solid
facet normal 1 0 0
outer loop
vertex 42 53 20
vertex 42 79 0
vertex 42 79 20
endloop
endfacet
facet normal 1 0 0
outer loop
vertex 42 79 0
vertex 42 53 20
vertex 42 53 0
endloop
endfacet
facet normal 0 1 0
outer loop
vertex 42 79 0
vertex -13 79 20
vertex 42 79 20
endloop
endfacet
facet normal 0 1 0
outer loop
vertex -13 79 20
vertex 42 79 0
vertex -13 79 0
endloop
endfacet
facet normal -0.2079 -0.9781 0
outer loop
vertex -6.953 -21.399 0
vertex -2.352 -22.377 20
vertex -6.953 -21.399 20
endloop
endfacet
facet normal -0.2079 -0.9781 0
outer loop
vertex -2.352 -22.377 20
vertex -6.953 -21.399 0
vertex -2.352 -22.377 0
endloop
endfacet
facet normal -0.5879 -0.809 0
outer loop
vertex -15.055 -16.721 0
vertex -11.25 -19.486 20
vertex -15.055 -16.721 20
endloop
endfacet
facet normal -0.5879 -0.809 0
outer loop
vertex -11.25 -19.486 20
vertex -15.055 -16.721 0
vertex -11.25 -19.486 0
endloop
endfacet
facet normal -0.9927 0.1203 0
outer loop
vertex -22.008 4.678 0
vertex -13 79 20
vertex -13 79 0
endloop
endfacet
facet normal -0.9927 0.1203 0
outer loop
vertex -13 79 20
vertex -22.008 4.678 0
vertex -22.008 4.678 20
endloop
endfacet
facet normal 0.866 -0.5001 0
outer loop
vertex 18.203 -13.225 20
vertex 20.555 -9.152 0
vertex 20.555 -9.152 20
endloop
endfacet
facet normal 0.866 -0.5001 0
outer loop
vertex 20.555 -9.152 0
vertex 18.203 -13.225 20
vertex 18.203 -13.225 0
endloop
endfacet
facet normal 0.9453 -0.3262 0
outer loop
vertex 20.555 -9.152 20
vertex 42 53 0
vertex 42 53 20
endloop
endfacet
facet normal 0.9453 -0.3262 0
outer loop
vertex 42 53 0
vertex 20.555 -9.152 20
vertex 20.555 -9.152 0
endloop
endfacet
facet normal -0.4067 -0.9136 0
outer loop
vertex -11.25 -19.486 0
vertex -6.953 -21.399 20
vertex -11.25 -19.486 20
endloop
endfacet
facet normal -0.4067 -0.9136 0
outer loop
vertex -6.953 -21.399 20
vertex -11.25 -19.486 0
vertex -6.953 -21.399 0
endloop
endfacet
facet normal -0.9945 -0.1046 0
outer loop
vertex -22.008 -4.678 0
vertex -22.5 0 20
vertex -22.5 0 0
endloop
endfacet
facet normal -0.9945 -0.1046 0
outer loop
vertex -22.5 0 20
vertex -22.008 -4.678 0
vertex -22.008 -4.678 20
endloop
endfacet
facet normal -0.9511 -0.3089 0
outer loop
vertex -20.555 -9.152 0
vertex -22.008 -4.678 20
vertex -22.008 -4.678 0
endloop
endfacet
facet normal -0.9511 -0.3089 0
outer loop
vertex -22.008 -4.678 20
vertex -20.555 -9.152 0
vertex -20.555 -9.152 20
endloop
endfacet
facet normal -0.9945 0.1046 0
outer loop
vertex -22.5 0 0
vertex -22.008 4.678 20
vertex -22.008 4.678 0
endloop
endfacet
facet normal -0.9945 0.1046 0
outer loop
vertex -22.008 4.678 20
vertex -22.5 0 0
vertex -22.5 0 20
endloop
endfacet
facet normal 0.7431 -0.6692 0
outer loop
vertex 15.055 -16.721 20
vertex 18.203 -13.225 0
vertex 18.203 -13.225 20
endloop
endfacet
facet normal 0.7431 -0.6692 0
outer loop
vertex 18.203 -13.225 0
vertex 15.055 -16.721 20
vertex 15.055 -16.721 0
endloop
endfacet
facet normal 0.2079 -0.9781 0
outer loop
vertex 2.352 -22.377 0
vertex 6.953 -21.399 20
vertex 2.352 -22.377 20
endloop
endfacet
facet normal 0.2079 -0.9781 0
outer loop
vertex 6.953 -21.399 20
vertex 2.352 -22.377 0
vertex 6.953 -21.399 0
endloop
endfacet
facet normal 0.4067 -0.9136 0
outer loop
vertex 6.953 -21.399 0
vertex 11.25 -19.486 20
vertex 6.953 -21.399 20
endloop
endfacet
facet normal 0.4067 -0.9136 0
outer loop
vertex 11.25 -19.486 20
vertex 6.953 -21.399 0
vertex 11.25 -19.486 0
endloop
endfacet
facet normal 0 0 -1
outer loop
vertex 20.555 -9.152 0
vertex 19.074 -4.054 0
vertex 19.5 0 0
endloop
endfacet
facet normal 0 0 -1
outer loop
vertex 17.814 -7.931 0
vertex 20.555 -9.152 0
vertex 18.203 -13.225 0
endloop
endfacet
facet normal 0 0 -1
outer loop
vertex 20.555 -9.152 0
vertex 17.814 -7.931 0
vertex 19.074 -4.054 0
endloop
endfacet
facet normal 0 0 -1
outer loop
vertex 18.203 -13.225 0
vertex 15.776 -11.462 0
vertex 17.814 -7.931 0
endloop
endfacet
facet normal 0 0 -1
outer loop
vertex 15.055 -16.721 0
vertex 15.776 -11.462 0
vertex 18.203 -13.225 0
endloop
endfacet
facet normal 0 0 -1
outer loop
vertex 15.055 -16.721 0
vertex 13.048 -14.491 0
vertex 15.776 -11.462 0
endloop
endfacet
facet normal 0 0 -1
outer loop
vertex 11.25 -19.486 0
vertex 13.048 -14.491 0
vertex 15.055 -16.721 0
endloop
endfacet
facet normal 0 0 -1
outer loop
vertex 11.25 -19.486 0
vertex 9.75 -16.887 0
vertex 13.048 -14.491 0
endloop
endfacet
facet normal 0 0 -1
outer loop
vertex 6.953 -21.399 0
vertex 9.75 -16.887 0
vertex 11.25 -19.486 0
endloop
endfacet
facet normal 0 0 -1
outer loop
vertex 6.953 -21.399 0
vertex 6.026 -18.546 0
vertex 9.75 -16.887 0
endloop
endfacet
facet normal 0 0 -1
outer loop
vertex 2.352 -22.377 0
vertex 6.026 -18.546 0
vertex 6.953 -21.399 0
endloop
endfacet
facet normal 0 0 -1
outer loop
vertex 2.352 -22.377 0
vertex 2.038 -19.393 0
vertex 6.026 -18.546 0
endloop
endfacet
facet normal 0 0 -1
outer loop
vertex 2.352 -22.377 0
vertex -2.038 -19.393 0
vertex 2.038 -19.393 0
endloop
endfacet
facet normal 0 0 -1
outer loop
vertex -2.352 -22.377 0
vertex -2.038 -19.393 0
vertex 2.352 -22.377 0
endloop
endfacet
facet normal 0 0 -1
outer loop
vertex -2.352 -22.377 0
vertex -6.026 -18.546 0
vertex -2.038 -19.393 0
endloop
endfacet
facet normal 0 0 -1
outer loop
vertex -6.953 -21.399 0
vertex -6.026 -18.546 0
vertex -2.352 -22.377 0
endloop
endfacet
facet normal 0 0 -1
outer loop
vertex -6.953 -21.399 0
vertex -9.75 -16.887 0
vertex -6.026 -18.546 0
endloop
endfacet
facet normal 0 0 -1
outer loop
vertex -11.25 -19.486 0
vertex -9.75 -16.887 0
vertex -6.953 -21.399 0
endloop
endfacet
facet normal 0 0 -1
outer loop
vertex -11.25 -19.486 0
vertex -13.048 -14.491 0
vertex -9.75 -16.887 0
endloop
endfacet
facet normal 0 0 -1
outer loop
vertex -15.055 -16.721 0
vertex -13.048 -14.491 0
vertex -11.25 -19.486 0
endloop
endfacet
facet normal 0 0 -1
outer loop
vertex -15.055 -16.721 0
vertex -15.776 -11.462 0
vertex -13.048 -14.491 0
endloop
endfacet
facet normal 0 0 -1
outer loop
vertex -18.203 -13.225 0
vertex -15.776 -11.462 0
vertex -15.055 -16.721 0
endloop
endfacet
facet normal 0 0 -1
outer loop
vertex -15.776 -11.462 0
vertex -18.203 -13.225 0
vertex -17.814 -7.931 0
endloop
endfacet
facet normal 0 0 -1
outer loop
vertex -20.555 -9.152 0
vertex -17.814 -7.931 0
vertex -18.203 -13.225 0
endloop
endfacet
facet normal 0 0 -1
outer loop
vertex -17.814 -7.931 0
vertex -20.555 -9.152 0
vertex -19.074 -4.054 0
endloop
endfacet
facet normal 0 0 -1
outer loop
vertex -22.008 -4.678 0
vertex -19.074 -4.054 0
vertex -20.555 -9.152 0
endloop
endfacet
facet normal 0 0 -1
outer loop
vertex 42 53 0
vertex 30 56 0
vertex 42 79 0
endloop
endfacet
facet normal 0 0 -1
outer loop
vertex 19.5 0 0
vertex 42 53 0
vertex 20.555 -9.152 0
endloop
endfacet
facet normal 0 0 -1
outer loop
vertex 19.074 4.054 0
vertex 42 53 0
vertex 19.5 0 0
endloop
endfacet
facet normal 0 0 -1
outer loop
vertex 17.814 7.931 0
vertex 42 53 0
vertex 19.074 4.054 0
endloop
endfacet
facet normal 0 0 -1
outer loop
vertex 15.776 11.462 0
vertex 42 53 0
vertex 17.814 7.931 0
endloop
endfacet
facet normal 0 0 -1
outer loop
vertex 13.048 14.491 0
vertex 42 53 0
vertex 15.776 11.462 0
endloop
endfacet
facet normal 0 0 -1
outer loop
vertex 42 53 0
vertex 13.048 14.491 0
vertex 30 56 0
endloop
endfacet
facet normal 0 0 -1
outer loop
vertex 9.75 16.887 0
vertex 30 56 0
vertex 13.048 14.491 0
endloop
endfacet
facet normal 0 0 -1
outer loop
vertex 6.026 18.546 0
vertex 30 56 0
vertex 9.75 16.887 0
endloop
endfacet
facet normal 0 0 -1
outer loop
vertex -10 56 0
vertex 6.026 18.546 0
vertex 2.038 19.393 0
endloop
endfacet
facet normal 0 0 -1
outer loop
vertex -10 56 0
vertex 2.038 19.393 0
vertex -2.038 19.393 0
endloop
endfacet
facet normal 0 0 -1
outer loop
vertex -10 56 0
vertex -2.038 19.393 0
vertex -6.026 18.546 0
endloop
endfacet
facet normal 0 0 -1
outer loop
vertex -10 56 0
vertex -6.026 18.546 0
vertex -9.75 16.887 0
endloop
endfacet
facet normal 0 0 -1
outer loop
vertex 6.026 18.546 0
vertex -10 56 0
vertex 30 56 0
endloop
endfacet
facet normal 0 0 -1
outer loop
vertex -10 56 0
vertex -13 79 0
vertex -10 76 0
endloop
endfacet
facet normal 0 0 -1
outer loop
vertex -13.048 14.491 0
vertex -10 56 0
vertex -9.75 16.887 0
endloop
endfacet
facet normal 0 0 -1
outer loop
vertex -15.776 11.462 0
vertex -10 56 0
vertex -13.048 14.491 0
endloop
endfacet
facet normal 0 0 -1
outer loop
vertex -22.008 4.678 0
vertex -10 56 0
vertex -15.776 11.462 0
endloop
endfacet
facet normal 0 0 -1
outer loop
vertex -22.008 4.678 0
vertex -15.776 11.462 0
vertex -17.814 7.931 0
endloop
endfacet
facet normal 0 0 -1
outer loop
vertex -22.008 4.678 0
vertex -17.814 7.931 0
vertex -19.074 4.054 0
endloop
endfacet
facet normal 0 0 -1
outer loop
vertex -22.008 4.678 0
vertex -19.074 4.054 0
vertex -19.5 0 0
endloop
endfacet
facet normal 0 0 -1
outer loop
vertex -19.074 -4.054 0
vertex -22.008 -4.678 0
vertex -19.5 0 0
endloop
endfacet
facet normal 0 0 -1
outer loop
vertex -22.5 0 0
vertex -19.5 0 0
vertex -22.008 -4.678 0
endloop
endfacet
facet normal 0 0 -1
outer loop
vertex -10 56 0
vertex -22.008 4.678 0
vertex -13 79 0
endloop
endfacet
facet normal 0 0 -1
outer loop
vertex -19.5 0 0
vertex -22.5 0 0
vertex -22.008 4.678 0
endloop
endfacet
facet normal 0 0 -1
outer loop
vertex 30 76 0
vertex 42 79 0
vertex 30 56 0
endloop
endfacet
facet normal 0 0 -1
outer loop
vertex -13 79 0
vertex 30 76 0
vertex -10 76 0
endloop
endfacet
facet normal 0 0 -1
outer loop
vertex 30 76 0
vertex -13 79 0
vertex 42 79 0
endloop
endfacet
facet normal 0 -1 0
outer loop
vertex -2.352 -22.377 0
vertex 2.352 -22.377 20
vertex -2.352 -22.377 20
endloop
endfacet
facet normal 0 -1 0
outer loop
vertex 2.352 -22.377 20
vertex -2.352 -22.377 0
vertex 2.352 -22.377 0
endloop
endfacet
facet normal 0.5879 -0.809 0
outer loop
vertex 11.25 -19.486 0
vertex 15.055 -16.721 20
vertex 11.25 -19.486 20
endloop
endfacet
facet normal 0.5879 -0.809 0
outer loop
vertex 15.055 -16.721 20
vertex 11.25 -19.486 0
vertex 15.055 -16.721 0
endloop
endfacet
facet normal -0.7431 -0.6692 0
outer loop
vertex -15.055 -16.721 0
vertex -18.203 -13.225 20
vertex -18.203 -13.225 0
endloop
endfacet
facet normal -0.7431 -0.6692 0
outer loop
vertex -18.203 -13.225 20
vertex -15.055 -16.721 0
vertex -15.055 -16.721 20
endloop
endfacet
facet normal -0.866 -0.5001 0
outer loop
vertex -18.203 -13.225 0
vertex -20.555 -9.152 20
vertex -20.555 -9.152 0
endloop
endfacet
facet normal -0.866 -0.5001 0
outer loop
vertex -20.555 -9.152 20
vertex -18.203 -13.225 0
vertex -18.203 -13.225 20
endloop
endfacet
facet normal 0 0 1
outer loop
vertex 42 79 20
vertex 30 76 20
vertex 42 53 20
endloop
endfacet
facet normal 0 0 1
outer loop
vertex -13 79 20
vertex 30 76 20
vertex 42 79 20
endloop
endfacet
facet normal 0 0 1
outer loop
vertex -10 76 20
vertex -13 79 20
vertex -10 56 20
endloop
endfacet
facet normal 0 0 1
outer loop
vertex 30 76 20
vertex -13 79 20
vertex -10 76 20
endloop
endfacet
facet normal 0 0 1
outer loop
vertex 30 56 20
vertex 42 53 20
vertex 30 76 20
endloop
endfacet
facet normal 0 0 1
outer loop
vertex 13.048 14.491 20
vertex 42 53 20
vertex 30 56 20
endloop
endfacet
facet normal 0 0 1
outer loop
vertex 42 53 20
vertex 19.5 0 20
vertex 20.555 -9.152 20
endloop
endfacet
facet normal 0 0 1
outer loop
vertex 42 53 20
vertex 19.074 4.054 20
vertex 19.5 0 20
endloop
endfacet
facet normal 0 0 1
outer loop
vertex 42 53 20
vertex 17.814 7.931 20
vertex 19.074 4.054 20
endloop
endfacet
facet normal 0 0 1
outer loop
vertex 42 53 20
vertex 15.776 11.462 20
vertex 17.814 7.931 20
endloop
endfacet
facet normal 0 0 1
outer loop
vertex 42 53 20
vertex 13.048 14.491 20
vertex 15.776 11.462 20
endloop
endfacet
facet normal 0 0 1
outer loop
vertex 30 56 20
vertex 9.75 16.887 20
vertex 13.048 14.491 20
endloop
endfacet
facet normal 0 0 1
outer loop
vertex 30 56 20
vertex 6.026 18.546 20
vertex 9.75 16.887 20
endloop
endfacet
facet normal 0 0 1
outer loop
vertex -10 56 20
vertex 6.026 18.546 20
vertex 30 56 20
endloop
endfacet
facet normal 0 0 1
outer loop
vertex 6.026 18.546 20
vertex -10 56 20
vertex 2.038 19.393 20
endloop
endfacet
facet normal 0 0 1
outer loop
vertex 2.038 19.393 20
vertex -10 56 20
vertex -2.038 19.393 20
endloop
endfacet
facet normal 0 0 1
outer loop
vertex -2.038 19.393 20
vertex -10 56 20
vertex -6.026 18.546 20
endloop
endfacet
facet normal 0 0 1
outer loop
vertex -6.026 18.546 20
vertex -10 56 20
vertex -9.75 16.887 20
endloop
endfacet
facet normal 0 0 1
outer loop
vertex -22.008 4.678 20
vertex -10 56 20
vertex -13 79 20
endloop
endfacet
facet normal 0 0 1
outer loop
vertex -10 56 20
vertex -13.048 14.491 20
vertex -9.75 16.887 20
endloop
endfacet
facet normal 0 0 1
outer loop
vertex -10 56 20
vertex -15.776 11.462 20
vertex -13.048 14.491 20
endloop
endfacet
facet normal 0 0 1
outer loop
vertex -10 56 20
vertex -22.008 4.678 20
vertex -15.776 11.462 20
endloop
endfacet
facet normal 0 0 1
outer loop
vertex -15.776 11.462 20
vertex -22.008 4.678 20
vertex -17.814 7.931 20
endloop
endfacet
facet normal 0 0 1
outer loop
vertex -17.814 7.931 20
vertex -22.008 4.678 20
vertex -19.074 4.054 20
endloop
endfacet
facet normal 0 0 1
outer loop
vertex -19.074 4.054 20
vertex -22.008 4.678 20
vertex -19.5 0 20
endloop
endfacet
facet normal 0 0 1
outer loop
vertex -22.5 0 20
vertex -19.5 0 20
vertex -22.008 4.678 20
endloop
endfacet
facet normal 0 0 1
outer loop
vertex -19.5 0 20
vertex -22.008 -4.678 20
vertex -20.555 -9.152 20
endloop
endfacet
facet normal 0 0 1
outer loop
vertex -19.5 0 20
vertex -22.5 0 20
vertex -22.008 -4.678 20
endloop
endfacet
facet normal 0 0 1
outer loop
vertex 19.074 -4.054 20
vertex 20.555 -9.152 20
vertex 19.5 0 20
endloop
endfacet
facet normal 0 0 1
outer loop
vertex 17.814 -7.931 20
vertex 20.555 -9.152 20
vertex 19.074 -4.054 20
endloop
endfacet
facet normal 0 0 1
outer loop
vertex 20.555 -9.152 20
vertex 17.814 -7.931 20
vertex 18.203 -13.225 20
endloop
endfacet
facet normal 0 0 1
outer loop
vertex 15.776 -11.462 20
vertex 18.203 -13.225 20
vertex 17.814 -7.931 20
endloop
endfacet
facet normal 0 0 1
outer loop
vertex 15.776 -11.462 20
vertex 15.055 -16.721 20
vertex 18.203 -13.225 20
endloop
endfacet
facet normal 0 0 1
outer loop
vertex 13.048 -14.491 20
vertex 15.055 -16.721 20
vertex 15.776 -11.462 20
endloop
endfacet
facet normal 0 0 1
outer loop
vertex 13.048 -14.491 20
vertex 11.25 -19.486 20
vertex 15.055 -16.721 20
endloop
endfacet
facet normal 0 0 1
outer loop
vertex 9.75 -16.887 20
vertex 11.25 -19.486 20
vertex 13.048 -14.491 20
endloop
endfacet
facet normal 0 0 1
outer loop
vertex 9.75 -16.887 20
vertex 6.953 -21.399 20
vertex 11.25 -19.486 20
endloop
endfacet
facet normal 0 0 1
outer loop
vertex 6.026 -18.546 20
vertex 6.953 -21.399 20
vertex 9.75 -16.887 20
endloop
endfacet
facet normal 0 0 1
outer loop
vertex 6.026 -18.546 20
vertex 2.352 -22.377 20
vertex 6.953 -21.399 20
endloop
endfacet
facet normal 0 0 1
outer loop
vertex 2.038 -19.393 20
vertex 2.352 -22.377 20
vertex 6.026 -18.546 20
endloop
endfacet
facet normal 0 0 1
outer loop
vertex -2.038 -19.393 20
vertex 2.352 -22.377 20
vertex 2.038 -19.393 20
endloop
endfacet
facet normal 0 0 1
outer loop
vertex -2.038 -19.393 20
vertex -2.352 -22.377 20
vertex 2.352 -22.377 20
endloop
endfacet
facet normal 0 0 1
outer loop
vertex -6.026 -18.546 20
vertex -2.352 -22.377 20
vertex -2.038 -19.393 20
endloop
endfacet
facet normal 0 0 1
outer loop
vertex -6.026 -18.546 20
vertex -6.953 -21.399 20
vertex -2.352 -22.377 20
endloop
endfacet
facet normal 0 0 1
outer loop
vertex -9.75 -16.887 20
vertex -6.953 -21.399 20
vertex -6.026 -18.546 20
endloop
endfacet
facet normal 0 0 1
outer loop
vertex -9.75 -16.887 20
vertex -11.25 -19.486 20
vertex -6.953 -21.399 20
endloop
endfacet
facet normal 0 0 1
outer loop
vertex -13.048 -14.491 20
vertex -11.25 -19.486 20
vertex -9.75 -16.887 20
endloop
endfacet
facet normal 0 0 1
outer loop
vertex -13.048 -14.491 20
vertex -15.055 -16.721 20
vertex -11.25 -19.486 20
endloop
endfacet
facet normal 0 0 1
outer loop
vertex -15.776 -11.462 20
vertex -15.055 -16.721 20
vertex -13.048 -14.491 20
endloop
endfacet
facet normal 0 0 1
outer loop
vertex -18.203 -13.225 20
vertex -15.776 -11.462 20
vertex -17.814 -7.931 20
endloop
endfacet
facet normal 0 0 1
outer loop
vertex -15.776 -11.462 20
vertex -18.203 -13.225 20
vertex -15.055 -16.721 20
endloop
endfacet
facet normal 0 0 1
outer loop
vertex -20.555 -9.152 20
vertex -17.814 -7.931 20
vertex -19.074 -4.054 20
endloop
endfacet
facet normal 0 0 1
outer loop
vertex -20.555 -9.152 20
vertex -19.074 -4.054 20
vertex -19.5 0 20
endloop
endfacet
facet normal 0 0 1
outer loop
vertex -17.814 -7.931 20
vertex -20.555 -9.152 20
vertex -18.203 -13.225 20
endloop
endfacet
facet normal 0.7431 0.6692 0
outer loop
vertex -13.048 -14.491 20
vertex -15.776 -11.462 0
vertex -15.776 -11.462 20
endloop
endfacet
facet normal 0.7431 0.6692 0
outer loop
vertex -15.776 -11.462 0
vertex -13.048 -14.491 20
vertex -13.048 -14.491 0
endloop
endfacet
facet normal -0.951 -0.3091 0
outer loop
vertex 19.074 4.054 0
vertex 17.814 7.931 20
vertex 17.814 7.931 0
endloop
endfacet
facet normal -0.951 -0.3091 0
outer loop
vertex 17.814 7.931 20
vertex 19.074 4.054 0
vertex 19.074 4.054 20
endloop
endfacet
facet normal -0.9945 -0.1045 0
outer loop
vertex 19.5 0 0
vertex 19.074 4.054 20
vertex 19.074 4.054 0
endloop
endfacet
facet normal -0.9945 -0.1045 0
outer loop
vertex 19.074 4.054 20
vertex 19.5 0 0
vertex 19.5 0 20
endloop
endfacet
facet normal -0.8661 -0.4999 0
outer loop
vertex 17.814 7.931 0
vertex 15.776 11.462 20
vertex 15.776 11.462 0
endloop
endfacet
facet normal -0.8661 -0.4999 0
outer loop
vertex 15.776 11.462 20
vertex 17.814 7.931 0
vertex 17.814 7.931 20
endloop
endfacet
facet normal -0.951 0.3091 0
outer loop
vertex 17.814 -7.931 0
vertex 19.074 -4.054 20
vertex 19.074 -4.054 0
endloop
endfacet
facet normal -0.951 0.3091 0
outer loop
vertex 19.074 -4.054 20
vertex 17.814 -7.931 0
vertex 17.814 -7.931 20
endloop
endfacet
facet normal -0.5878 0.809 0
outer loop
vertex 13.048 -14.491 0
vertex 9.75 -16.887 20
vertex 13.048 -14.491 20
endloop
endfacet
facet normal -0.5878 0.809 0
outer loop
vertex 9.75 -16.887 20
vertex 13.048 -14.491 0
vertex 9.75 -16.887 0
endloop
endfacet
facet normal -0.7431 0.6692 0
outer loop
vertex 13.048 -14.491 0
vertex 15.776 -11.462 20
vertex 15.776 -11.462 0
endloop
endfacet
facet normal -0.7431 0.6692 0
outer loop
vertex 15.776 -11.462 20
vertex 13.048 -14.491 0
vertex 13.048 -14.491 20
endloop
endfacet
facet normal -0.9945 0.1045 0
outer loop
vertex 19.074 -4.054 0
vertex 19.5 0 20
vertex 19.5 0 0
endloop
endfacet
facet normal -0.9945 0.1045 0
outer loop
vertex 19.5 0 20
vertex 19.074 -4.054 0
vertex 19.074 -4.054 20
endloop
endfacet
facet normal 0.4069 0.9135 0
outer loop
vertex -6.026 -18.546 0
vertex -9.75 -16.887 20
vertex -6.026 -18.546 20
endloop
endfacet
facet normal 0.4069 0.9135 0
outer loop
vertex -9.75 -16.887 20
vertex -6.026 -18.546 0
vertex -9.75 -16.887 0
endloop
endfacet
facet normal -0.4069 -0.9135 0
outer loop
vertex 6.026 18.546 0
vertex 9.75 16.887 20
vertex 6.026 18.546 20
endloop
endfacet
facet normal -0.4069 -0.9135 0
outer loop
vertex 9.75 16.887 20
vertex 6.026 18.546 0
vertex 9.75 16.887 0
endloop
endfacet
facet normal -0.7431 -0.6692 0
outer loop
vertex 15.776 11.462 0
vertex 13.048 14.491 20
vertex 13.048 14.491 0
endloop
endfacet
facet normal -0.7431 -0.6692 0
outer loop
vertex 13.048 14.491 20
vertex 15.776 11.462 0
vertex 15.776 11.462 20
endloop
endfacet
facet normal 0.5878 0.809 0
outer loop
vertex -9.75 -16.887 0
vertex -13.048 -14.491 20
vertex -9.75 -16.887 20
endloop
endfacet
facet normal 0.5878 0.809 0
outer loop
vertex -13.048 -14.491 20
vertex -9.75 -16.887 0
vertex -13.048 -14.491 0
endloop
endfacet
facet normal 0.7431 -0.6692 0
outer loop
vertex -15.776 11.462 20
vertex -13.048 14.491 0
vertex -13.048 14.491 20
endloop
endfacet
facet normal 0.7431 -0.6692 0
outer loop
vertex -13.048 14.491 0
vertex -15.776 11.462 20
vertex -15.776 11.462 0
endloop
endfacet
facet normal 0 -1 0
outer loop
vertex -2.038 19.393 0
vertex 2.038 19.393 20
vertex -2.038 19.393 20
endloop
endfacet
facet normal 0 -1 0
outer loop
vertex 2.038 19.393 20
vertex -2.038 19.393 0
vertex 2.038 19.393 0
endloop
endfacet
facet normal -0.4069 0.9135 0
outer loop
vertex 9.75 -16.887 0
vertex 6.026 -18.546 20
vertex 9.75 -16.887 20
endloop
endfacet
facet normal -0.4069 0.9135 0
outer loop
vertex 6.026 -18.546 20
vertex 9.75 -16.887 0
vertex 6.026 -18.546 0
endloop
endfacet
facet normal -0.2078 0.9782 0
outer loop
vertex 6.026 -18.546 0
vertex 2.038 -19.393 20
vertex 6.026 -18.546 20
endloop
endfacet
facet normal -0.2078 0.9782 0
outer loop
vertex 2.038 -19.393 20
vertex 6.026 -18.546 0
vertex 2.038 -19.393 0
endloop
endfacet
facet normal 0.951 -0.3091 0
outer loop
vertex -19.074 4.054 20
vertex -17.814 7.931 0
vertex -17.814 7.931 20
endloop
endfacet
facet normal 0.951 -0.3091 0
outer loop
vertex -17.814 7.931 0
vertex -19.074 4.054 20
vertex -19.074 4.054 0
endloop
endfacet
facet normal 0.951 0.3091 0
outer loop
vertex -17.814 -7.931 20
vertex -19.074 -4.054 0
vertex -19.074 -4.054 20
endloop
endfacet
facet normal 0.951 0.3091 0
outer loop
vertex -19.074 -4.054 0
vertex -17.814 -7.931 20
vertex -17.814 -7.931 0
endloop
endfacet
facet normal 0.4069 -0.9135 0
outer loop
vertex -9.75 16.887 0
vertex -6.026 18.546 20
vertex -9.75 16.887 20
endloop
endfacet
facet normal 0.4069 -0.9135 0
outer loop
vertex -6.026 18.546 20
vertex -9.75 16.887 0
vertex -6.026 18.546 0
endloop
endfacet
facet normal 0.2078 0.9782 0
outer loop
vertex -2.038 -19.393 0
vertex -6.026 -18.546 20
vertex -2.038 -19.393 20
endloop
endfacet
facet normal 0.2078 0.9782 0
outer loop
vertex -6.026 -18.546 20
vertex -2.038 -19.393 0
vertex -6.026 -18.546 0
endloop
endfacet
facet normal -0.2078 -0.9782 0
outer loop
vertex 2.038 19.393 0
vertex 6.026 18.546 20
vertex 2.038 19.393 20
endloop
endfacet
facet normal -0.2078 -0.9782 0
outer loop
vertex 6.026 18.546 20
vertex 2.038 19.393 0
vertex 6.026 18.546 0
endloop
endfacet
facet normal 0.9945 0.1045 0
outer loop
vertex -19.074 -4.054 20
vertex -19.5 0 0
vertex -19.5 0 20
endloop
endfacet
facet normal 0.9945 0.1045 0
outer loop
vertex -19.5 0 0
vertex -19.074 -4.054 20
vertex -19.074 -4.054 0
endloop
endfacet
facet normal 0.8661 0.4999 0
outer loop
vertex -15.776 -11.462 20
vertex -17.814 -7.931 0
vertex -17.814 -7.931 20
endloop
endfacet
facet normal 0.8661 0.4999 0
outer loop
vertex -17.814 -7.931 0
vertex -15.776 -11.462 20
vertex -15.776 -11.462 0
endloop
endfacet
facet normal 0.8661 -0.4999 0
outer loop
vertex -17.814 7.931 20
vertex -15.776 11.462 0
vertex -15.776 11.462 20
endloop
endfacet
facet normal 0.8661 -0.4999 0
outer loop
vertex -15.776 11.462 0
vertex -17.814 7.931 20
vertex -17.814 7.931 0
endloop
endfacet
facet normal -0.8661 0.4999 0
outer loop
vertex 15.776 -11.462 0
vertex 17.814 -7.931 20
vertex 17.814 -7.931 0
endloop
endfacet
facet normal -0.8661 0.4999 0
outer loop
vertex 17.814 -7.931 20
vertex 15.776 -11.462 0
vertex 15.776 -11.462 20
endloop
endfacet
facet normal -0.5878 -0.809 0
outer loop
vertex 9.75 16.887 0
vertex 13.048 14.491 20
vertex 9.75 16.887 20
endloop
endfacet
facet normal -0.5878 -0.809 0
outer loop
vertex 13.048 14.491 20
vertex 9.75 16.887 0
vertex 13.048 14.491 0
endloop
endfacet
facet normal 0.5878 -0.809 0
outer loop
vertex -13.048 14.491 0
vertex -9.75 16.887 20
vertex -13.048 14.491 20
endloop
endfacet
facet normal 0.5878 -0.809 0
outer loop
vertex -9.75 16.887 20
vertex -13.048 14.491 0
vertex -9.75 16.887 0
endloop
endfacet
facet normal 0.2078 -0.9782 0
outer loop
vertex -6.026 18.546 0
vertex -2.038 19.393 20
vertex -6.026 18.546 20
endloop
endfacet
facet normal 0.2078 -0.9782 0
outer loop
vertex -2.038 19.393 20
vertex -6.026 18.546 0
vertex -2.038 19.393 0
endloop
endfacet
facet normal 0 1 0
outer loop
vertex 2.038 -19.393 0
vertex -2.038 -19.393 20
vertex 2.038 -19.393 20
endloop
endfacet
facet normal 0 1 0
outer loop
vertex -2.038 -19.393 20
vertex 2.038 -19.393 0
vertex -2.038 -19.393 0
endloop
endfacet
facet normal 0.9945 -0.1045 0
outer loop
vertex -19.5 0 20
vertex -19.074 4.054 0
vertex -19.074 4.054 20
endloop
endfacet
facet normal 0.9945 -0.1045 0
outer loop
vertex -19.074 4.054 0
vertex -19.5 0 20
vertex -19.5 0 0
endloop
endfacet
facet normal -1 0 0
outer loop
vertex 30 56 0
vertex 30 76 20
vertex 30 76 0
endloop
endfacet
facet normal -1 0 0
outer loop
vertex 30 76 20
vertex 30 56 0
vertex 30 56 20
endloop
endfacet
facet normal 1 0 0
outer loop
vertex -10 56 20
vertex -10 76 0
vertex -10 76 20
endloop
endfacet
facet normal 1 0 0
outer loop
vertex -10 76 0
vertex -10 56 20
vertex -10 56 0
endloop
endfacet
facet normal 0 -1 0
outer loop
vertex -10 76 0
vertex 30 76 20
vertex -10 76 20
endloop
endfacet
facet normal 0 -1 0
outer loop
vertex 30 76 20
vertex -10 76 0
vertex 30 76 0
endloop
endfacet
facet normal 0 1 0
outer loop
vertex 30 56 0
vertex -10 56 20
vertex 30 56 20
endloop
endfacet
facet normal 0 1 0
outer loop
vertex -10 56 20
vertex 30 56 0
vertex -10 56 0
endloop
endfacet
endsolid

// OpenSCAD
sw = 20;
sl = 40;
sh = 48.5;
sg = 10;
sk = 55;

ld = 39;

zz = 20;
th = 3;

sox = -10;
soy = 56;

lgp = 2; // lens gear pitch
lgt = 28; // lens gear teeth

difference() {
    hull() {
        cylinder(d=ld+2*th,h=zz);
        translate([sox-th,soy-th,0]) cube([sk,sw+2*th,zz]);
    }
    translate([0,0,-1]) cylinder(d=ld,h=zz+2);
    translate([sox,soy,-1]) cube([sl,sw,zz+2]);
}
        
